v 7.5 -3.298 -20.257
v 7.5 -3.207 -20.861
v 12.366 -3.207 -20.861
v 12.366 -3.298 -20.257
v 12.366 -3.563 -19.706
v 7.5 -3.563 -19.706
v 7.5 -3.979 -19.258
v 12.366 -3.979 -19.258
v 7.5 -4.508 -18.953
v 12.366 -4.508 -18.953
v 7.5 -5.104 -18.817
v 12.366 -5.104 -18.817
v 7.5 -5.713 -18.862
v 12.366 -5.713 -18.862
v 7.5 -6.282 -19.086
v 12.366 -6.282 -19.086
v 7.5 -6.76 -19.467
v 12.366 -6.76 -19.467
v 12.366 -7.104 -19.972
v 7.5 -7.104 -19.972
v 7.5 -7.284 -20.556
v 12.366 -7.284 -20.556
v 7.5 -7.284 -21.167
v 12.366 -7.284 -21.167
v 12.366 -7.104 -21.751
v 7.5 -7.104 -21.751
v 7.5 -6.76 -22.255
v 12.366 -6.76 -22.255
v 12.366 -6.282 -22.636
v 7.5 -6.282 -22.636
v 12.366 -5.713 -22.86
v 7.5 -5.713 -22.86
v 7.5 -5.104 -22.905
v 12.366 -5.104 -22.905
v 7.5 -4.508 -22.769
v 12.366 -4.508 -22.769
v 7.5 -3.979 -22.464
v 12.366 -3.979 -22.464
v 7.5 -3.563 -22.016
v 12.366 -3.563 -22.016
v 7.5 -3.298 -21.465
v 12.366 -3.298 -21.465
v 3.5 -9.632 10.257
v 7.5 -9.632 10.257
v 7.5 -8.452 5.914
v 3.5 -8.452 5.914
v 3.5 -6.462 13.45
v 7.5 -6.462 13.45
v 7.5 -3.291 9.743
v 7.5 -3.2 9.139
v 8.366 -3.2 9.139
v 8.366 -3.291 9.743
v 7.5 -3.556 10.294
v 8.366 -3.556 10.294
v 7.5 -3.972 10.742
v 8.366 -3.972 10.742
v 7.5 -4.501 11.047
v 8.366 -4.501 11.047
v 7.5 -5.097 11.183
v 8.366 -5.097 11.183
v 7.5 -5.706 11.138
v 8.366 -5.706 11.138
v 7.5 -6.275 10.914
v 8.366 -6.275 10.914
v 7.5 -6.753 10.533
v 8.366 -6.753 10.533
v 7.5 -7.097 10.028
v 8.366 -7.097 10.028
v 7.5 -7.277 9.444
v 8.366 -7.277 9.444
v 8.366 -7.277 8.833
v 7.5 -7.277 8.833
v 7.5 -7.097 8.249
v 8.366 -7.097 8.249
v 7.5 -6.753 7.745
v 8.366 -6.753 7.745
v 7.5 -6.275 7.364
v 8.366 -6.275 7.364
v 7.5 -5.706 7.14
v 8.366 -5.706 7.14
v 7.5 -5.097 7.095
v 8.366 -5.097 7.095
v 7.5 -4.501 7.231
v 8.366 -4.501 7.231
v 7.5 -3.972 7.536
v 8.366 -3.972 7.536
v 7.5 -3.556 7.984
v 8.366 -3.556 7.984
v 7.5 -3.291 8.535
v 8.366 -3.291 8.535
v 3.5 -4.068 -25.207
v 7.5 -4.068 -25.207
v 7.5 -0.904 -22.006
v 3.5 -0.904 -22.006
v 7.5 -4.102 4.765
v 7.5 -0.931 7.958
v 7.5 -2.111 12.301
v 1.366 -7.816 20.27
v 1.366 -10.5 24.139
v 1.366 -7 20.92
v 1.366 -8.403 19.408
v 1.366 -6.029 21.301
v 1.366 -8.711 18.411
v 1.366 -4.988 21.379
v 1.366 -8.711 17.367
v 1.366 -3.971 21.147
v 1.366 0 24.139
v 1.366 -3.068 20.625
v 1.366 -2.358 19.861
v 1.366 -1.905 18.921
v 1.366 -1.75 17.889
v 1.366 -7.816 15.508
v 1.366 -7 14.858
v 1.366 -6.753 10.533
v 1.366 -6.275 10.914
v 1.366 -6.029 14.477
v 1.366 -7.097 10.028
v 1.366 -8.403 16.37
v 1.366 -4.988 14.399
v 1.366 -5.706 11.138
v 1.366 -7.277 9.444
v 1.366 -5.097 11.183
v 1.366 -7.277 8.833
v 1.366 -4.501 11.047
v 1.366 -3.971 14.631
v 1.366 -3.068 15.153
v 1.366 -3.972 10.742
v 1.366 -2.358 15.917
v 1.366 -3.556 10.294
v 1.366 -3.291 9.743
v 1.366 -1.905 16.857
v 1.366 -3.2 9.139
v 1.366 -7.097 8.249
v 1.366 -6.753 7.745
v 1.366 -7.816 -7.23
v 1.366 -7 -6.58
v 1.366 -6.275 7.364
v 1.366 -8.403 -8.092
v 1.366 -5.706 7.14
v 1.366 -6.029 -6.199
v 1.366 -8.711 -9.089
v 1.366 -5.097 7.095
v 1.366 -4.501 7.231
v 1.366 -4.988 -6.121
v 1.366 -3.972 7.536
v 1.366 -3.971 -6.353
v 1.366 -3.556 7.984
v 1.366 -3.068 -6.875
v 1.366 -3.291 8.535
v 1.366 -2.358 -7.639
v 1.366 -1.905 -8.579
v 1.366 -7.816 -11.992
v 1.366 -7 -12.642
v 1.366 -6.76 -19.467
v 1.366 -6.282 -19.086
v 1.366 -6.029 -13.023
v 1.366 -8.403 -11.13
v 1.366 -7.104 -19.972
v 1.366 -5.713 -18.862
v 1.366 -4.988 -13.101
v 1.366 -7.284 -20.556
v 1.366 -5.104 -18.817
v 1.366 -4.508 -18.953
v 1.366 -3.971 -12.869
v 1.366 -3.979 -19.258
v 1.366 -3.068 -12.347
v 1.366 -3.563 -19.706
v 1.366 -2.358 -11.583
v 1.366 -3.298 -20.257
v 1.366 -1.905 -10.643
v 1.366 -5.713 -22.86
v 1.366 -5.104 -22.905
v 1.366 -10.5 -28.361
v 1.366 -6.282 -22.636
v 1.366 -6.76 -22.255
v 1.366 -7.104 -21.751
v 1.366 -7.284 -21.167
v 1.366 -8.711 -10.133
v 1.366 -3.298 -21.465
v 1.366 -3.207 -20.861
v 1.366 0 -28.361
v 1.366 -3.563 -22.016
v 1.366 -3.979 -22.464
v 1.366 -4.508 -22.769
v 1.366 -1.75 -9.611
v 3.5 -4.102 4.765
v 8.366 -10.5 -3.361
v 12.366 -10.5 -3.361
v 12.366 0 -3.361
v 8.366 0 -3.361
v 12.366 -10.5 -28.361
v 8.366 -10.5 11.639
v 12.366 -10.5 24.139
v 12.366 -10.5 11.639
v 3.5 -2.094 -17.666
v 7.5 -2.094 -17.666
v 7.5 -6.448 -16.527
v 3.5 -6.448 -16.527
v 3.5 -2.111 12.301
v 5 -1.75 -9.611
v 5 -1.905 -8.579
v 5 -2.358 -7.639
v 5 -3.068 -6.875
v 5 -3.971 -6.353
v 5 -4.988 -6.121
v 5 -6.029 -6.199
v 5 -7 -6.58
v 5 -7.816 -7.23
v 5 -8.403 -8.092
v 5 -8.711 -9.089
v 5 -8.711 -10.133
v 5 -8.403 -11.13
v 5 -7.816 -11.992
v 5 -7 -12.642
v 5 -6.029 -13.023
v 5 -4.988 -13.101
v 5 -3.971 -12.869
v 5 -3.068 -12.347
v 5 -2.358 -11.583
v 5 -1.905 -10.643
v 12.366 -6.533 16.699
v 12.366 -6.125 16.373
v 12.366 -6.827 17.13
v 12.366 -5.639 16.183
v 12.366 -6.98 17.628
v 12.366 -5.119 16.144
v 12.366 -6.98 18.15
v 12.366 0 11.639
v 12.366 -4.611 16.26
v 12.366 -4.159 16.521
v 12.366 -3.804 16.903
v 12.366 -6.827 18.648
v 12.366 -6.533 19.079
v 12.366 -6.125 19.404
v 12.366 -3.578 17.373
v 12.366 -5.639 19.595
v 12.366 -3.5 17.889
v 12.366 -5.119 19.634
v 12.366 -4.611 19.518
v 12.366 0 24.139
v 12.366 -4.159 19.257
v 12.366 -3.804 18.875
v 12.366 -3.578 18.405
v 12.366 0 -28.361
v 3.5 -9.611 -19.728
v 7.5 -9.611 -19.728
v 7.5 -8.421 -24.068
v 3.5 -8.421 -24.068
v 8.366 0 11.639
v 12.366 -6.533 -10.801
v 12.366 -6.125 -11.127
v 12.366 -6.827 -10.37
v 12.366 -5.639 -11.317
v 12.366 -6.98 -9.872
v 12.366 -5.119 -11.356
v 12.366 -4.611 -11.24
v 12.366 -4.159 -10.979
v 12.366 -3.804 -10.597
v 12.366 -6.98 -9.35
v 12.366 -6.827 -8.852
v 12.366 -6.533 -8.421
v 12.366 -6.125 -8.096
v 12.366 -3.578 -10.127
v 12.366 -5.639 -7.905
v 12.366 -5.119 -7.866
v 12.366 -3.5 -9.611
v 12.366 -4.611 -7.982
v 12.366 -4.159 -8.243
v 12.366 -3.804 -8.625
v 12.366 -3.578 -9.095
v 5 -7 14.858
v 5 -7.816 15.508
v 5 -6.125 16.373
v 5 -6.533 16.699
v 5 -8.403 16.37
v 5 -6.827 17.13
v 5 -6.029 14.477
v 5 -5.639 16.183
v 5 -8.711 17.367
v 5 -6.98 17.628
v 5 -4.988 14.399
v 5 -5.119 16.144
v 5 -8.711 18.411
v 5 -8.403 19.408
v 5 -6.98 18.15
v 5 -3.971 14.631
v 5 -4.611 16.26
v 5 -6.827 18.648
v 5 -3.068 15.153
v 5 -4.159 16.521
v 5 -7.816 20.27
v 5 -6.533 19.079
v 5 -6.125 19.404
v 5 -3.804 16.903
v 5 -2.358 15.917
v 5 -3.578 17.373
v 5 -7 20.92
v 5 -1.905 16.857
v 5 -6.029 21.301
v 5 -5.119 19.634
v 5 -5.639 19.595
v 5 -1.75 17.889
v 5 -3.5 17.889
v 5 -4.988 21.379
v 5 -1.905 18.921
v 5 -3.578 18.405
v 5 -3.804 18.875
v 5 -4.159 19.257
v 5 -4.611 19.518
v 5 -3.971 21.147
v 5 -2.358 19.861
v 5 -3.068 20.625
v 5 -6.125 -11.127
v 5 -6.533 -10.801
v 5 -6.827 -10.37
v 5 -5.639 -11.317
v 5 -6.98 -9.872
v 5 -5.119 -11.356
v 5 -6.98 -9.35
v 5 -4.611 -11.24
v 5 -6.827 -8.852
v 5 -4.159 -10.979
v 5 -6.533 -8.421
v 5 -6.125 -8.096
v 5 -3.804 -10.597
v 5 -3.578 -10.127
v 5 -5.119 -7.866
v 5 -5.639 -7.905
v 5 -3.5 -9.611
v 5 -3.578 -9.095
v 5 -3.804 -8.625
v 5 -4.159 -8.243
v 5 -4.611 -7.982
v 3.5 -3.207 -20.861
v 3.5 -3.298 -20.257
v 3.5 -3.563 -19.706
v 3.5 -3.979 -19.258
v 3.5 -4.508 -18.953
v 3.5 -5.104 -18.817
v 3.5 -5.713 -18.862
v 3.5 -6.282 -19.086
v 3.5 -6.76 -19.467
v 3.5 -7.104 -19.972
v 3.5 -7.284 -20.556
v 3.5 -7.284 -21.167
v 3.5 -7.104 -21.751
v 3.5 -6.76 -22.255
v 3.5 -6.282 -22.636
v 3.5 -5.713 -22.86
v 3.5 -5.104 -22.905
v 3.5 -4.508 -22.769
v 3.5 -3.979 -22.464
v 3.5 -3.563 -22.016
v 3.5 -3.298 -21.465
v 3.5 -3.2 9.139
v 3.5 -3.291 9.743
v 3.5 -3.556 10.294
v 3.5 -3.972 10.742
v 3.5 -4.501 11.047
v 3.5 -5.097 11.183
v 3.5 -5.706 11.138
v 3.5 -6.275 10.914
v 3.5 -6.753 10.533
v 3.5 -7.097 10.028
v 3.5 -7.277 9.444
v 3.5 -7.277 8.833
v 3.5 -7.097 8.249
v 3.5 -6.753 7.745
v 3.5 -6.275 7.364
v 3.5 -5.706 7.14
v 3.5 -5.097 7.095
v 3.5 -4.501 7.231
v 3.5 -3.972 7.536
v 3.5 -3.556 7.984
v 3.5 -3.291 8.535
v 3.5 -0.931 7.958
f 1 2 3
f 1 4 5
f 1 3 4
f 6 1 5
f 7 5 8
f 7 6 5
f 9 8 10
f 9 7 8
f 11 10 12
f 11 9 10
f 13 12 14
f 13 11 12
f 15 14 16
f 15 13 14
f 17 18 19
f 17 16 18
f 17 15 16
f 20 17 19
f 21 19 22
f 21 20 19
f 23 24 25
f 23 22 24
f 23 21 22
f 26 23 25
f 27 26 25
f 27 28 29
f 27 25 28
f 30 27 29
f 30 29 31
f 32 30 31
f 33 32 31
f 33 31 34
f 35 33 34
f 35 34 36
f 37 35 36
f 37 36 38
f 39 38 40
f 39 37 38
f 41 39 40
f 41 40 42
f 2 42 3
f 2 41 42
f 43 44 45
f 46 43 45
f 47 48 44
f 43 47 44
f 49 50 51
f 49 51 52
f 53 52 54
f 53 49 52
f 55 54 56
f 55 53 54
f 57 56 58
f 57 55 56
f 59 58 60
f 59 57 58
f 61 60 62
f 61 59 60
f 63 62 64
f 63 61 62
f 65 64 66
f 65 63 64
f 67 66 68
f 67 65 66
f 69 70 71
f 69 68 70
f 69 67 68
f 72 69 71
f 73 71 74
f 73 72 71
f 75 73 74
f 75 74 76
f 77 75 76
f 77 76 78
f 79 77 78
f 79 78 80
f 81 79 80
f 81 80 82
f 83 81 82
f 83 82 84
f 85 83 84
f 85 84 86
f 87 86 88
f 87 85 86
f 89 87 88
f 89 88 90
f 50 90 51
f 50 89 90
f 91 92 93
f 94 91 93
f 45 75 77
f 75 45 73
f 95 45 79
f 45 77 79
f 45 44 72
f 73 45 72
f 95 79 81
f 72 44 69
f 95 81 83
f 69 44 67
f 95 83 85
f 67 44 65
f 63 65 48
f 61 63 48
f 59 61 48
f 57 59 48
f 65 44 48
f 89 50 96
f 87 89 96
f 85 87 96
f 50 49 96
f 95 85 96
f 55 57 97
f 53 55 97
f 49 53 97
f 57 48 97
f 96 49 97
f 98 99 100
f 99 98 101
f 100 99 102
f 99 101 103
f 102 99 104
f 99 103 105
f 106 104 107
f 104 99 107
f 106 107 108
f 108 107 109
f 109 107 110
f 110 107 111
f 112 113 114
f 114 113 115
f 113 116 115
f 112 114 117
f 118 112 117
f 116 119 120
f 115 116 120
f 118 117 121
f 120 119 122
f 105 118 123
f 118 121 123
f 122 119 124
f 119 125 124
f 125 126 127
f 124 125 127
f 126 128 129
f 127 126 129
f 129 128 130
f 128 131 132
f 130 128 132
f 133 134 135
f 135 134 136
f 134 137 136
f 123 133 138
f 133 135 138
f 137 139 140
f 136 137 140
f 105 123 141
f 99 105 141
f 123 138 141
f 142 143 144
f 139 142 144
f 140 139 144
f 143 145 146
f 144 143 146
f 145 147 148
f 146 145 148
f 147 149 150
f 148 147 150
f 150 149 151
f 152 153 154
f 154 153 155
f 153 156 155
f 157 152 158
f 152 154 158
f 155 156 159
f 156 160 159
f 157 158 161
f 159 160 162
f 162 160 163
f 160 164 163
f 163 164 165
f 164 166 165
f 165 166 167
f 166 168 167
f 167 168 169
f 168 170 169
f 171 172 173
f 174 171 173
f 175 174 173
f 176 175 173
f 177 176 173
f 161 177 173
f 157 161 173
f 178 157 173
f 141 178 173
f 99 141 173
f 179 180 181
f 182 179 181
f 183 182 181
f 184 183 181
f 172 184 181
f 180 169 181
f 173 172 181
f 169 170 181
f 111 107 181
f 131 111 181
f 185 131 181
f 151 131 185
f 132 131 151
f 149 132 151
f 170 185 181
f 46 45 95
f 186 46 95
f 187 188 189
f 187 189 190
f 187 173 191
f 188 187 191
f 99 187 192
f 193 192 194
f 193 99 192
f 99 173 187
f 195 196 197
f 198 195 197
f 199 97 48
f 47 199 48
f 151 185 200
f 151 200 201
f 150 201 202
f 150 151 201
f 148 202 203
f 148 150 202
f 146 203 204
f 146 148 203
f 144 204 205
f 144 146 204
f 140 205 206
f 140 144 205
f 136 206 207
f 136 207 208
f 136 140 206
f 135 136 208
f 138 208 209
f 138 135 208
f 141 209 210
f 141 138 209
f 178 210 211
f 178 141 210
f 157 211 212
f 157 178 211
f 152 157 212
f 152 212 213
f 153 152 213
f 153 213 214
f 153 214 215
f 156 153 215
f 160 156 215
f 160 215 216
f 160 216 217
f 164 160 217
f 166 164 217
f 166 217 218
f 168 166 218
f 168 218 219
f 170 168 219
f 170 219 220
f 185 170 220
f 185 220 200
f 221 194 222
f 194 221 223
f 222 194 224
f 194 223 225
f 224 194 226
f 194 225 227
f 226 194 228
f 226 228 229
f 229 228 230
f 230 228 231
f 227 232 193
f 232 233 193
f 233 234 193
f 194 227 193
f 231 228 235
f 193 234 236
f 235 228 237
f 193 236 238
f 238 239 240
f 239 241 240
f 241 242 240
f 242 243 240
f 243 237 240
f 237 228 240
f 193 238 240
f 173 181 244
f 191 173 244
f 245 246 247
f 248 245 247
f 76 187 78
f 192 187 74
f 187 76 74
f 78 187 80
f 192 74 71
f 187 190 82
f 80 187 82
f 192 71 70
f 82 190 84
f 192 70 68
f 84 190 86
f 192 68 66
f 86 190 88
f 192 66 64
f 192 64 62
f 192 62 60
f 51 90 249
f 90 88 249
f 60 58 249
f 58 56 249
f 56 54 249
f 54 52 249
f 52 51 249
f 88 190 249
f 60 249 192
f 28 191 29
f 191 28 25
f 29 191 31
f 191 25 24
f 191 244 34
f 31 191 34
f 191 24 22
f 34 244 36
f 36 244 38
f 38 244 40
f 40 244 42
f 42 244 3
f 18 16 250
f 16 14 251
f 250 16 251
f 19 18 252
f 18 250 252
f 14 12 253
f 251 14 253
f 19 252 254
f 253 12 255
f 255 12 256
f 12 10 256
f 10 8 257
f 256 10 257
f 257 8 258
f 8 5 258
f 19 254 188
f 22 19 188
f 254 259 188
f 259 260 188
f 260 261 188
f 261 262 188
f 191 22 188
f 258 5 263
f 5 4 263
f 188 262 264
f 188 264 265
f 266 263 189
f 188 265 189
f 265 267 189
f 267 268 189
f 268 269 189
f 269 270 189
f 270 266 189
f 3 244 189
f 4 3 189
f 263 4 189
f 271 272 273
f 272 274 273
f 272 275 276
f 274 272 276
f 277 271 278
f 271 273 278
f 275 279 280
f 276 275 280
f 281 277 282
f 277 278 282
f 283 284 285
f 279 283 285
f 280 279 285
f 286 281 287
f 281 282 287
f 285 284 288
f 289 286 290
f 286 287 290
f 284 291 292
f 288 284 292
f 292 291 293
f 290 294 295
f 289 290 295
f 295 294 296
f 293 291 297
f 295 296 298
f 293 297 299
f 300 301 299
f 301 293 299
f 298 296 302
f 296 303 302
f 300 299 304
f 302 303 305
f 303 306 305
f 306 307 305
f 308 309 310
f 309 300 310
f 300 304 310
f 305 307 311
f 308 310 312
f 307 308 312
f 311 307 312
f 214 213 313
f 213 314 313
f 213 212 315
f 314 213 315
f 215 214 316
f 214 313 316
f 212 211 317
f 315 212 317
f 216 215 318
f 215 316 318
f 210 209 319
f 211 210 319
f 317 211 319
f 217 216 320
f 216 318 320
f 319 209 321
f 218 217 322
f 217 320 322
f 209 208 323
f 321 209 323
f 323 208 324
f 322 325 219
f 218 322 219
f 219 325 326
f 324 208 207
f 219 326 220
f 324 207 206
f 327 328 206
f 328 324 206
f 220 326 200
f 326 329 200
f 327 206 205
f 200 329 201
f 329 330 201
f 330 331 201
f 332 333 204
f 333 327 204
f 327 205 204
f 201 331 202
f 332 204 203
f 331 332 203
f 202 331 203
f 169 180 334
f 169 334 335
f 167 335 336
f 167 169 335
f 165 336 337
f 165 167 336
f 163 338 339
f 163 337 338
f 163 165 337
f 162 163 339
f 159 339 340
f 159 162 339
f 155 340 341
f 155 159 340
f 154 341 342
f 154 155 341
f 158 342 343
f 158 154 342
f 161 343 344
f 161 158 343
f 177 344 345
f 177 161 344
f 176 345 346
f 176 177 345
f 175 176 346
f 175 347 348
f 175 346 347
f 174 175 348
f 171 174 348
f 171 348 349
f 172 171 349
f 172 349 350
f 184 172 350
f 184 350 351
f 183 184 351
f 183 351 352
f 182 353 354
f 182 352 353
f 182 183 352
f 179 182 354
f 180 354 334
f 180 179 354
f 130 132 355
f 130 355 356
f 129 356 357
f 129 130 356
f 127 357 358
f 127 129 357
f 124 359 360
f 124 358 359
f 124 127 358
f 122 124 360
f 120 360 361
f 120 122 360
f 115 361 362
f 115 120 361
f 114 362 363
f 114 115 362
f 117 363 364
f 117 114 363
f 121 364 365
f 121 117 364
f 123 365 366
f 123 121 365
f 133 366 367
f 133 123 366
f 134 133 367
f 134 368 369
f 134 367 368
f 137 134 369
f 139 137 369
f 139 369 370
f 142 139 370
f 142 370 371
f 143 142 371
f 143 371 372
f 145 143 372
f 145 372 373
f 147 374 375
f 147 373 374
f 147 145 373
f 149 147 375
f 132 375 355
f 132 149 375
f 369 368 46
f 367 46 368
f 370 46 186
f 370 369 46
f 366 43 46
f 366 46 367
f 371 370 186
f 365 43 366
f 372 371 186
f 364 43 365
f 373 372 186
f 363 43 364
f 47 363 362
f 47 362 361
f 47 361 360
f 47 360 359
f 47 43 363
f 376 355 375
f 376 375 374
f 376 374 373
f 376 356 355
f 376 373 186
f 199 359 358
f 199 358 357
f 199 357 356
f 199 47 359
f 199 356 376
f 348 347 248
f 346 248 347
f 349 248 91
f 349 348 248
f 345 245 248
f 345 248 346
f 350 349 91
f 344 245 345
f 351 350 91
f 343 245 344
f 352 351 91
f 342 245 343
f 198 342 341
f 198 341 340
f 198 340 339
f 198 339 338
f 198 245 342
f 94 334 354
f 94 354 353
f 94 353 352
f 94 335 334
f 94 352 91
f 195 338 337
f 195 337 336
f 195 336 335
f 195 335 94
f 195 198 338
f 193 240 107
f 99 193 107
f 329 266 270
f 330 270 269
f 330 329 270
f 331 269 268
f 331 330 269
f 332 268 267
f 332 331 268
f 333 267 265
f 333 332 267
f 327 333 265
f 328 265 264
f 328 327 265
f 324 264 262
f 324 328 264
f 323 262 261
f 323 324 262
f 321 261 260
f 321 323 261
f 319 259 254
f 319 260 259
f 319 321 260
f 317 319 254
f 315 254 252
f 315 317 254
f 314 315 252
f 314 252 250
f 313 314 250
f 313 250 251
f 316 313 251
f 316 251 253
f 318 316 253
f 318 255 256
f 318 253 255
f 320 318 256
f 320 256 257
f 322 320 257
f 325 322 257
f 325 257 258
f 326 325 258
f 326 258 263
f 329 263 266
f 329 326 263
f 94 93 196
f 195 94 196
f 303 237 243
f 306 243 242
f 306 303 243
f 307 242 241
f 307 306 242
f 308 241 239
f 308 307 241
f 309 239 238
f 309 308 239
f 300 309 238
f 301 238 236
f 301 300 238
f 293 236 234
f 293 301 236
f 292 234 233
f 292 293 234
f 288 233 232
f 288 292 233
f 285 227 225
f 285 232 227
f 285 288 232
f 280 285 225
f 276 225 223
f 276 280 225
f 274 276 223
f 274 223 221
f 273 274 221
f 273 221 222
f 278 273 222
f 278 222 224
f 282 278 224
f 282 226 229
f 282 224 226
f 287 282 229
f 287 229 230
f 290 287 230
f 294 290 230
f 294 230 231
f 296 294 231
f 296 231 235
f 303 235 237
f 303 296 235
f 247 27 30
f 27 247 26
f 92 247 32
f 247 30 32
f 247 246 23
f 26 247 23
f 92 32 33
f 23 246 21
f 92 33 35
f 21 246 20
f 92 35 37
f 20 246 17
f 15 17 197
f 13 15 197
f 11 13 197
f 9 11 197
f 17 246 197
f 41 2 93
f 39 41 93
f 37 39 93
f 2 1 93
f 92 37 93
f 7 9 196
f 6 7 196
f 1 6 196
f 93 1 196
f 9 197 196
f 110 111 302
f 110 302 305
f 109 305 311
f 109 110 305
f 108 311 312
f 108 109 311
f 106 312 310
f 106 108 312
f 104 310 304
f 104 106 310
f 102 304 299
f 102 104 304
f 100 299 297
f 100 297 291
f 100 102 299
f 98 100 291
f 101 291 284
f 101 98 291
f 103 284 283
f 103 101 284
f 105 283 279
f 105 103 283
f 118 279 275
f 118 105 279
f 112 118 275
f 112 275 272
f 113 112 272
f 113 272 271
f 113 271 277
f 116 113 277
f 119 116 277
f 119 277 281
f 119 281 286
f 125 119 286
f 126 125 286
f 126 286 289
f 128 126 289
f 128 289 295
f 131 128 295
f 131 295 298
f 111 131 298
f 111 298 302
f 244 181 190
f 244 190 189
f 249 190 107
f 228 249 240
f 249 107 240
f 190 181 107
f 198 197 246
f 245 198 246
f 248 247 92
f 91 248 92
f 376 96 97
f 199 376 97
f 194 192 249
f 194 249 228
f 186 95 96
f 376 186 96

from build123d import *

# Parameters (mm, degrees)
F1_DEPTH = 10.5
F2_R     = 1.75
F3_DEPTH = 50
F2_R_2   = 3.5
F4_DEPTH = 5
F2_R_3   = 2.05
F5_DEPTH = 20
F8_DEPTH = 4


with BuildPart() as f1:
    # F0 (on Front) → F1 (new body)
    with BuildSketch(Plane.XZ):
        Polygon((9.366447, 24.13893), (1.366447, 24.13893), (1.366447, -28.36107), (12.366447, -28.36107), (12.366447, -3.36107), (8.366447, -3.36107), (8.366447, 11.63893), (12.366447, 11.63893), (12.366447, 24.13893), align=None)
    extrude(amount=F1_DEPTH)

    # F2 (on Right) → F3 (cut)
    with BuildSketch(Plane.YZ):
        with Locations((-5.25, -9.61107)):
            Circle(F2_R)
        with Locations((-5.25, 17.88893)):
            Circle(F2_R)
    extrude(amount=F3_DEPTH, mode=Mode.SUBTRACT)

    # F2 (on Right) → F4 (cut)
    with BuildSketch(Plane.YZ):
        with Locations((-5.25, -9.61107)):
            Circle(F2_R_2)
        with Locations((-5.25, -9.61107)):
            Circle(F2_R, mode=Mode.SUBTRACT)
        with Locations((-5.25, 17.88893)):
            Circle(F2_R_2)
        with Locations((-5.25, 17.88893)):
            Circle(F2_R, mode=Mode.SUBTRACT)
    extrude(amount=F4_DEPTH, mode=Mode.SUBTRACT)

    # F2 (on Right) → F5 (cut)
    with BuildSketch(Plane.YZ):
        with Locations((-5.256939, -20.86107)):
            Circle(F2_R_3)
        with Locations((-5.25, 9.13893)):
            Circle(F2_R_3)
    extrude(amount=F5_DEPTH, mode=Mode.SUBTRACT)

    # F7 (on offset) → F8 (cut)
    with BuildSketch(Plane.YZ.offset(7.5)):
        Polygon((-6.44787, -16.527179), (-9.611129, -19.727772), (-8.420963, -24.06753), (-4.067539, -25.206696), (-0.90428, -22.006103), (-2.094446, -17.666345), align=None)
        Polygon((-6.461621, 13.450113), (-9.632396, 10.256967), (-8.452437, 5.914422), (-4.101703, 4.765023), (-0.930928, 7.95817), (-2.110887, 12.300715), align=None)
    extrude(amount=-F8_DEPTH, mode=Mode.SUBTRACT)


solid = f1.part
